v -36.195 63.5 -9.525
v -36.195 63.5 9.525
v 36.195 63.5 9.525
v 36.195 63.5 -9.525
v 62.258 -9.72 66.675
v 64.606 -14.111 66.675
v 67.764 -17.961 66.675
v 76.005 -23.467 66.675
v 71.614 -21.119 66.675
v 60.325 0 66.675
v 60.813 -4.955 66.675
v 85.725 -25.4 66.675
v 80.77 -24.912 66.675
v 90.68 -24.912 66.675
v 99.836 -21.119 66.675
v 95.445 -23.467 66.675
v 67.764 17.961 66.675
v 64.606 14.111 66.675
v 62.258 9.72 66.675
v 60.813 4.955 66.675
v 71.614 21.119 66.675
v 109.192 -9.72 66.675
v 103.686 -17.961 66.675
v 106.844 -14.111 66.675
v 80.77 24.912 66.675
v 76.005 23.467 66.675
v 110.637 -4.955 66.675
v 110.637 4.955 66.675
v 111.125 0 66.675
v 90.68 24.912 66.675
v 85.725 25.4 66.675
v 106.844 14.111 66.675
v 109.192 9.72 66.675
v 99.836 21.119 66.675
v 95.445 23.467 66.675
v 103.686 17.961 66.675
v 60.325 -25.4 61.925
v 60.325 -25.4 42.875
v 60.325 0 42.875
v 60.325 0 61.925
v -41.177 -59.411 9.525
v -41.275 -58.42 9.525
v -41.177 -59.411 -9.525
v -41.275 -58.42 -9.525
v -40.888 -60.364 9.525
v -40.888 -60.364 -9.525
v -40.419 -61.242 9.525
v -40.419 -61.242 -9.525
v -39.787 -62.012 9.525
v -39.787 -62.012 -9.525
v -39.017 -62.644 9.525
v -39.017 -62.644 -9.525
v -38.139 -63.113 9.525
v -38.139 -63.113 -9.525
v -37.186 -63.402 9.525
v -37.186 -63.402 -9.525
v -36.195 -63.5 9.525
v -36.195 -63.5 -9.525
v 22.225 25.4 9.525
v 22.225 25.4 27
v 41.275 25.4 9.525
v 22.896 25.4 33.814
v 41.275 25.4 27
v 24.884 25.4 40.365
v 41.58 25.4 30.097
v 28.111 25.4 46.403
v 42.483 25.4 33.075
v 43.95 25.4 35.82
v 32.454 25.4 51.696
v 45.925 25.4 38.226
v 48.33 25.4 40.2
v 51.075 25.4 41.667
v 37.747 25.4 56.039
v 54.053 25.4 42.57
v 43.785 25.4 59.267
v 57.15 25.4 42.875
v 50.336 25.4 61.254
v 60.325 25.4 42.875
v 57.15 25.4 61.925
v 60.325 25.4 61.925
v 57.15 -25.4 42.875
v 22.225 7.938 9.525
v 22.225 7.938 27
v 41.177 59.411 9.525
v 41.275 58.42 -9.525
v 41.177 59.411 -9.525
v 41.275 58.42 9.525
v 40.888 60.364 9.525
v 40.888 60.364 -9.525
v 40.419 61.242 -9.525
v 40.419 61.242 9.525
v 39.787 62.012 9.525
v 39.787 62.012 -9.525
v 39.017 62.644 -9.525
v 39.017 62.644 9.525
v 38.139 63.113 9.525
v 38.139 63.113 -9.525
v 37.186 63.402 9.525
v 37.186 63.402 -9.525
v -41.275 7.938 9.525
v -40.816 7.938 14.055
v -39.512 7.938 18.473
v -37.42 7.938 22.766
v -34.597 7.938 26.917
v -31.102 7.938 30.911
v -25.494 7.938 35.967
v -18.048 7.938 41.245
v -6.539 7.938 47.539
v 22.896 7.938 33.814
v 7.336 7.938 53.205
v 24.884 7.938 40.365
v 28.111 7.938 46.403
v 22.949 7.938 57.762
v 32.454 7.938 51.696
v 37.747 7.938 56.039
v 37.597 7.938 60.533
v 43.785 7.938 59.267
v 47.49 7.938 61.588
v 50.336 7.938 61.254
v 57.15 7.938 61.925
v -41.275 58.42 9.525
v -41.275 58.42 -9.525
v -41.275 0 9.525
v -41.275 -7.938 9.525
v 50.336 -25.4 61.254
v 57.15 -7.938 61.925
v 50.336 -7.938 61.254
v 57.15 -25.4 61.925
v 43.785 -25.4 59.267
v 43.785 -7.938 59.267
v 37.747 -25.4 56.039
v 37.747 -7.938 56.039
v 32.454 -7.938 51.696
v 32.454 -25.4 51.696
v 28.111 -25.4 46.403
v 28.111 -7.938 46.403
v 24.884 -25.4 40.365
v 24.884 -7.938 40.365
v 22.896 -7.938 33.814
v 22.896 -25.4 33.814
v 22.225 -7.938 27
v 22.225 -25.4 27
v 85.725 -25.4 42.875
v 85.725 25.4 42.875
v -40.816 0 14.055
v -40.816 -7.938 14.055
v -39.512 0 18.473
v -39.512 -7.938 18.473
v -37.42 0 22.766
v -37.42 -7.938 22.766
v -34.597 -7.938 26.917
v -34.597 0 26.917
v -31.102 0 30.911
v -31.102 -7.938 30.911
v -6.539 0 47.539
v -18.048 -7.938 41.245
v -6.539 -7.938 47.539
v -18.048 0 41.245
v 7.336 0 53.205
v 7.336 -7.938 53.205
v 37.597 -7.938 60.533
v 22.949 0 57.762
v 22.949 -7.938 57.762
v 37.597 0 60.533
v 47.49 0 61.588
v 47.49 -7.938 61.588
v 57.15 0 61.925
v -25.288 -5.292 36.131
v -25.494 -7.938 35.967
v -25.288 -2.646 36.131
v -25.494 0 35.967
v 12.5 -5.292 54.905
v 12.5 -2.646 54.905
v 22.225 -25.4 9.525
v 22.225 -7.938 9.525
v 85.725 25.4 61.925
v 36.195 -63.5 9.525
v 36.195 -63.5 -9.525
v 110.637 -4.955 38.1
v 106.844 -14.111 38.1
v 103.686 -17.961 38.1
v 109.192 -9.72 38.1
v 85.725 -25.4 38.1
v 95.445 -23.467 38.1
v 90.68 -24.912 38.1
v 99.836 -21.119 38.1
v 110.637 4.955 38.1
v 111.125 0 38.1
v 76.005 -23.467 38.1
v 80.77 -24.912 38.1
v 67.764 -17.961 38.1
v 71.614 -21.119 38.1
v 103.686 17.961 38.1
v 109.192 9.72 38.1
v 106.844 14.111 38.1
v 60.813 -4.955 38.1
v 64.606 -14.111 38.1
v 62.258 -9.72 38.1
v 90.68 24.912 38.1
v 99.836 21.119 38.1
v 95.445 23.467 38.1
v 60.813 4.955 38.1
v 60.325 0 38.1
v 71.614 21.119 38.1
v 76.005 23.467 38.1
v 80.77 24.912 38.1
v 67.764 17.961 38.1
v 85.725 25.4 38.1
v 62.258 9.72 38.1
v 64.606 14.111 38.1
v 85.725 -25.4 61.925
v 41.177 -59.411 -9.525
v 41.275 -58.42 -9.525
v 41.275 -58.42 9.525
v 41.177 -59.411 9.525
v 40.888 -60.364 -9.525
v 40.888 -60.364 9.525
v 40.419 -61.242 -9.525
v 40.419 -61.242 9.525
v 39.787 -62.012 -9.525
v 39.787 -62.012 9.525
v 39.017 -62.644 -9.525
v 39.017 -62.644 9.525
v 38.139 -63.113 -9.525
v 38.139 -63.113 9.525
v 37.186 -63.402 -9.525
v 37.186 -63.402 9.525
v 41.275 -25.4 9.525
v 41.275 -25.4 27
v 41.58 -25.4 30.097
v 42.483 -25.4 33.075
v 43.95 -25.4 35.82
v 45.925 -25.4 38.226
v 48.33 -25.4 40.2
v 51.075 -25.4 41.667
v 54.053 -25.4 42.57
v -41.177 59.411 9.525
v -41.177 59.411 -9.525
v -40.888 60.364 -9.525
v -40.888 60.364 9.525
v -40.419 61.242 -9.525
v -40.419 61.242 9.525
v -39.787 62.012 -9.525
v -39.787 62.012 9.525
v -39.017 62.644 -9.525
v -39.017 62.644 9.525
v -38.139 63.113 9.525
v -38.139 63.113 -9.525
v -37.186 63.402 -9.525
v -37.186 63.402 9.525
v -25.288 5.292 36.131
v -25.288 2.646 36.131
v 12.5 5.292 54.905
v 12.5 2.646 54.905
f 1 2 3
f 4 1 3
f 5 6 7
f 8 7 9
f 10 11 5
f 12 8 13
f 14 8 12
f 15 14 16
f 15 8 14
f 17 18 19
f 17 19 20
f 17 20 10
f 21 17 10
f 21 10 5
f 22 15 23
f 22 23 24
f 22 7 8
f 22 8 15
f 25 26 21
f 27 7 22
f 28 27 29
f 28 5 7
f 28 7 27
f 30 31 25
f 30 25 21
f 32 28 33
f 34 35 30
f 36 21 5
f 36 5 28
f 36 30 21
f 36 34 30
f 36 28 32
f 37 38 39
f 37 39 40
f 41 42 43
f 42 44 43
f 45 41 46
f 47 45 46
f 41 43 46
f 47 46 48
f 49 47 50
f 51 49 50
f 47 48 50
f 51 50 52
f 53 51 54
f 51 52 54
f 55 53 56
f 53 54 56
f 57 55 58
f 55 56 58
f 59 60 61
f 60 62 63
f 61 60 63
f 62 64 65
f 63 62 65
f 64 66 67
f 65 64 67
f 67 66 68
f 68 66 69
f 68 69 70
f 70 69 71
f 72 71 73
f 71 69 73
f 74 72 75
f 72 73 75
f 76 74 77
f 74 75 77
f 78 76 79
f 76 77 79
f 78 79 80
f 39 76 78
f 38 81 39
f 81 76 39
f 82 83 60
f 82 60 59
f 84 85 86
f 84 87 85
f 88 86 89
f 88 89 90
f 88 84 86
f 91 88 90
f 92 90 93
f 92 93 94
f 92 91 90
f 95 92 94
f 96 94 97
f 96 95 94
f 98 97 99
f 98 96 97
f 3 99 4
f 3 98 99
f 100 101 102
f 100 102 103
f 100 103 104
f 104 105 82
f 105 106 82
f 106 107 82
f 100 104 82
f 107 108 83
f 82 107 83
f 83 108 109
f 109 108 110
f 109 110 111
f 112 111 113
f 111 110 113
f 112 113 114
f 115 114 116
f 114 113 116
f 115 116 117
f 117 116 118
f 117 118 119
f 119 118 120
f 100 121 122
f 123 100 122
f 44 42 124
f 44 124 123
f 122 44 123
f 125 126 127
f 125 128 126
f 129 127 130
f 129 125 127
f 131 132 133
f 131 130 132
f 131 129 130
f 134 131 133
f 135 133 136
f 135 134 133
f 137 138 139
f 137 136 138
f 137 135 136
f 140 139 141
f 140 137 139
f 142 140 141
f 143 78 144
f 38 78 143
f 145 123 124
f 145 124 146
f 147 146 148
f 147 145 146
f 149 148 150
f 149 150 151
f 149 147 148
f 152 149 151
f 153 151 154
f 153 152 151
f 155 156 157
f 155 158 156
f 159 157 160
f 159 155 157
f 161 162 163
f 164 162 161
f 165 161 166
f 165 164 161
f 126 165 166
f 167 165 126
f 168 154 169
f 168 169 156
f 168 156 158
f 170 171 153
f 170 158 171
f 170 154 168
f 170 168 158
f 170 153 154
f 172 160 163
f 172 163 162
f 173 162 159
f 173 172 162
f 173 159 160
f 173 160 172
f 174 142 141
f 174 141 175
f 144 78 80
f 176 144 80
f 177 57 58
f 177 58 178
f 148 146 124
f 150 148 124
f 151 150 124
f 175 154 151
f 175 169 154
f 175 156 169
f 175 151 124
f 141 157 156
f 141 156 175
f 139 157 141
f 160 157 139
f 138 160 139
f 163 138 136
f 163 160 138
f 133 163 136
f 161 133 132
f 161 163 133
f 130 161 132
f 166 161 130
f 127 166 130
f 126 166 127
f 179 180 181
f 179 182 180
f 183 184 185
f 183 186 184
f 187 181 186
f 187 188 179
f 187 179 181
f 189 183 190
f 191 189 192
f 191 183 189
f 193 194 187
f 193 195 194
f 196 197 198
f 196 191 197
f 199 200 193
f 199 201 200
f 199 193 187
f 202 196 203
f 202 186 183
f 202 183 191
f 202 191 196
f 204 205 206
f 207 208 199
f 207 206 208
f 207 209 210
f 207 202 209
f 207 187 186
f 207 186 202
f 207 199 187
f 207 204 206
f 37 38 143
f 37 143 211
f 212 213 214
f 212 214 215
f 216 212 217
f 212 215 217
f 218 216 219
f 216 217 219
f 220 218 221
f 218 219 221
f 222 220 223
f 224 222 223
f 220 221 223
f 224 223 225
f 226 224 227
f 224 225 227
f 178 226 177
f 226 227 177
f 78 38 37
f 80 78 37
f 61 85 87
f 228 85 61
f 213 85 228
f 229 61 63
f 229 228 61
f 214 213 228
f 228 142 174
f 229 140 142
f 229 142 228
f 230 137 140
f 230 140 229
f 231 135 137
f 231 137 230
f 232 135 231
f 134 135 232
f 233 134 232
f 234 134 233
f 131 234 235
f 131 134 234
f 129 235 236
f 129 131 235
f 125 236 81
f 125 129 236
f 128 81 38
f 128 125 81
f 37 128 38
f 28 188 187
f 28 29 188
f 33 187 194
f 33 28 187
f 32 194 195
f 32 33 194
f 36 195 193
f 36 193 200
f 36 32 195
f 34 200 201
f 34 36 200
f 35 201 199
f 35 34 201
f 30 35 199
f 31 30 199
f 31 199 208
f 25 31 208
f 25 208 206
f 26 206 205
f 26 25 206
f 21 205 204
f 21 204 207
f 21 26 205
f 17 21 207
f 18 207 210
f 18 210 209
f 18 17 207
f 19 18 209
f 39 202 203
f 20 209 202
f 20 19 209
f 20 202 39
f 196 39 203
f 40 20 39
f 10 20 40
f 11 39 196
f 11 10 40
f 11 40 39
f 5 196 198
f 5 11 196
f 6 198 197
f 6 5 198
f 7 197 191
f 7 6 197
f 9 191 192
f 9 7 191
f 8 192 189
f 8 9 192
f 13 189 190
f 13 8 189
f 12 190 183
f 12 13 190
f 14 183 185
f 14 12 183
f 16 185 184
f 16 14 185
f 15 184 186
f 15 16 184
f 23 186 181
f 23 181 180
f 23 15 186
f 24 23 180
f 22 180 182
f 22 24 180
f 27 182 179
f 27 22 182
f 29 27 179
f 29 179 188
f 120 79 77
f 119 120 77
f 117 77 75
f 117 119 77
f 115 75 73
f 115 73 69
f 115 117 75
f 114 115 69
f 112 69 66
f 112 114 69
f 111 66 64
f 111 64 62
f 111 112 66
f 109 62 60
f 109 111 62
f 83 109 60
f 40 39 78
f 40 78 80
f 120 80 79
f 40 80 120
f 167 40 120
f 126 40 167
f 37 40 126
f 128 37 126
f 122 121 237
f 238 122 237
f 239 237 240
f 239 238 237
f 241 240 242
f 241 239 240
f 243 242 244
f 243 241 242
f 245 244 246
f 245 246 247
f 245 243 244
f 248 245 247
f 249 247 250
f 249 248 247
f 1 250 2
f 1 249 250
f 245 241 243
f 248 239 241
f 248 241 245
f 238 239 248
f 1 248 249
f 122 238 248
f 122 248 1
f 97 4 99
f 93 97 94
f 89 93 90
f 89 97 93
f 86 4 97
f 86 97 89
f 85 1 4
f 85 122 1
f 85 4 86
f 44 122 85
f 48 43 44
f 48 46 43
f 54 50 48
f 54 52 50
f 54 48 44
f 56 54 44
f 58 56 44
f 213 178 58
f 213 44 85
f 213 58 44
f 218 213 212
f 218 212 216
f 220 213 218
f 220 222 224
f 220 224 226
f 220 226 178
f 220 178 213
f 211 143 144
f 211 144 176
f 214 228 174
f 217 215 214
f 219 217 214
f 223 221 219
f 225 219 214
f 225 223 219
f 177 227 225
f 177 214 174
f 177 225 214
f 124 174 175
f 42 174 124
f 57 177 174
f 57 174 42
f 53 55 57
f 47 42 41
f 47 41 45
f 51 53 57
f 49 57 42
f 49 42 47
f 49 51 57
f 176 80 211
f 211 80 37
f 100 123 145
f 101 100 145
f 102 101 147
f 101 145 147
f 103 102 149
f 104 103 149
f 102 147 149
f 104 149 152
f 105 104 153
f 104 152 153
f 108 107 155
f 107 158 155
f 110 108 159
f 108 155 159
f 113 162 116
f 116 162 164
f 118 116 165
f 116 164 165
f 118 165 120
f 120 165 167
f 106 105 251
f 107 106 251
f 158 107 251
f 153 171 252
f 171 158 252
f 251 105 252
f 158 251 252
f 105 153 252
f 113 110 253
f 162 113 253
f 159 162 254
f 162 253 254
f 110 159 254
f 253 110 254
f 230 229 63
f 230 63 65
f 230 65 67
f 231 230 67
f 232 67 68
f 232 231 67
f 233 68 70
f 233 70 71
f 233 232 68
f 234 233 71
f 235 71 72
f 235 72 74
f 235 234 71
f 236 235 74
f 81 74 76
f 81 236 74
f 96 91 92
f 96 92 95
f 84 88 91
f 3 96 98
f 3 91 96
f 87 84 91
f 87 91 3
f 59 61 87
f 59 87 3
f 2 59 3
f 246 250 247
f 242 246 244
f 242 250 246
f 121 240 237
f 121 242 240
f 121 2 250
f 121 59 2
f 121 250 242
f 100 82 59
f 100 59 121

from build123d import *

# Parameters (mm, degrees)
F1_DEPTH = 63.5
F2_DEPTH = 25.4
F3_DEPTH = 7.9375
F5_DEPTH = 25.4
F6_R     = 5.08


with BuildPart() as f1:
    # F0 (on Front) → F1 (new body, symmetric)
    with BuildSketch(Plane.XZ):
        Polygon((41.275, -9.525), (41.275, 9.525), (22.225, 9.525), (-41.275, 9.525), (-41.275, -9.525), align=None)
    extrude(amount=F1_DEPTH, both=True)

    # F0 (on Front) → F2 (join, symmetric)
    with BuildSketch(Plane.XZ):
        with BuildLine():
            Line((22.225, 9.525), (41.275, 9.525))
            Line((41.275, 9.525), (41.275, 27.0002))
            ThreePointArc((41.275, 27.0002), (45.9246798487, 38.2255201513), (57.15, 42.8752))
            Line((57.15, 42.8752), (60.325, 42.8752))
            Line((60.325, 42.8752), (60.325, 61.9252))
            Line((60.325, 61.9252), (57.15, 61.9252))
            ThreePointArc((57.15, 61.9252), (32.4542956671, 51.6959043329), (22.225, 27.0002))
            Line((22.225, 27.0002), (22.225, 9.525))
        make_face()
    extrude(amount=F2_DEPTH, both=True)

    # F0 (on Front) → F3 (join, symmetric)
    with BuildSketch(Plane.XZ):
        with BuildLine():
            Line((-41.275, 9.525), (22.225, 9.525))
            Line((22.225, 9.525), (22.225, 27.0002))
            ThreePointArc((22.225, 27.0002), (32.4542956671, 51.6959043329), (57.15, 61.9252))
            add(Edge.make_bspline(
                [(-41.275, 9.525), (-41.1688387394, 38.7399420142), (14.0499072149, 62.0901808143), (57.15, 61.9252)],
                knots=[0, 0, 0, 0, 111.5045361635, 111.5045361635, 111.5045361635, 111.5045361635], degree=3))
        make_face()
    extrude(amount=F3_DEPTH, both=True)

    # F0 (on Front) → F4 (revolve)
    with BuildSketch(Plane.XZ):
        Polygon((85.725, 61.9252), (85.725, 42.8752), (85.725, 38.1), (111.125, 38.1), (111.125, 66.675), (85.725, 66.675), align=None)
    revolve(axis=Axis((85.725, 0, 52.3875), (0, 0, 1)))


with BuildPart() as f5:
    # F5 (new): faces of the model
    f5_faces = [f1.part.faces().sort_by_distance(p)[0] for p in [
        (60.325, 12.7, 52.4002),
        (60.325, -12.7, 52.4002),
    ]]
    extrude(f5_faces, amount=F5_DEPTH)


with BuildPart() as f1_1:
    add(f1.part)

    # F6
    f6_edges = [f1_1.edges().sort_by_distance(p)[0] for p in [
        (-41.275, -63.5, 0),
        (41.275, -63.5, 0),
        (41.275, 63.5, 0),
        (-41.275, 63.5, 0),
    ]]
    fillet(f6_edges, radius=F6_R)


solid = Compound([f5.part, f1_1.part])
